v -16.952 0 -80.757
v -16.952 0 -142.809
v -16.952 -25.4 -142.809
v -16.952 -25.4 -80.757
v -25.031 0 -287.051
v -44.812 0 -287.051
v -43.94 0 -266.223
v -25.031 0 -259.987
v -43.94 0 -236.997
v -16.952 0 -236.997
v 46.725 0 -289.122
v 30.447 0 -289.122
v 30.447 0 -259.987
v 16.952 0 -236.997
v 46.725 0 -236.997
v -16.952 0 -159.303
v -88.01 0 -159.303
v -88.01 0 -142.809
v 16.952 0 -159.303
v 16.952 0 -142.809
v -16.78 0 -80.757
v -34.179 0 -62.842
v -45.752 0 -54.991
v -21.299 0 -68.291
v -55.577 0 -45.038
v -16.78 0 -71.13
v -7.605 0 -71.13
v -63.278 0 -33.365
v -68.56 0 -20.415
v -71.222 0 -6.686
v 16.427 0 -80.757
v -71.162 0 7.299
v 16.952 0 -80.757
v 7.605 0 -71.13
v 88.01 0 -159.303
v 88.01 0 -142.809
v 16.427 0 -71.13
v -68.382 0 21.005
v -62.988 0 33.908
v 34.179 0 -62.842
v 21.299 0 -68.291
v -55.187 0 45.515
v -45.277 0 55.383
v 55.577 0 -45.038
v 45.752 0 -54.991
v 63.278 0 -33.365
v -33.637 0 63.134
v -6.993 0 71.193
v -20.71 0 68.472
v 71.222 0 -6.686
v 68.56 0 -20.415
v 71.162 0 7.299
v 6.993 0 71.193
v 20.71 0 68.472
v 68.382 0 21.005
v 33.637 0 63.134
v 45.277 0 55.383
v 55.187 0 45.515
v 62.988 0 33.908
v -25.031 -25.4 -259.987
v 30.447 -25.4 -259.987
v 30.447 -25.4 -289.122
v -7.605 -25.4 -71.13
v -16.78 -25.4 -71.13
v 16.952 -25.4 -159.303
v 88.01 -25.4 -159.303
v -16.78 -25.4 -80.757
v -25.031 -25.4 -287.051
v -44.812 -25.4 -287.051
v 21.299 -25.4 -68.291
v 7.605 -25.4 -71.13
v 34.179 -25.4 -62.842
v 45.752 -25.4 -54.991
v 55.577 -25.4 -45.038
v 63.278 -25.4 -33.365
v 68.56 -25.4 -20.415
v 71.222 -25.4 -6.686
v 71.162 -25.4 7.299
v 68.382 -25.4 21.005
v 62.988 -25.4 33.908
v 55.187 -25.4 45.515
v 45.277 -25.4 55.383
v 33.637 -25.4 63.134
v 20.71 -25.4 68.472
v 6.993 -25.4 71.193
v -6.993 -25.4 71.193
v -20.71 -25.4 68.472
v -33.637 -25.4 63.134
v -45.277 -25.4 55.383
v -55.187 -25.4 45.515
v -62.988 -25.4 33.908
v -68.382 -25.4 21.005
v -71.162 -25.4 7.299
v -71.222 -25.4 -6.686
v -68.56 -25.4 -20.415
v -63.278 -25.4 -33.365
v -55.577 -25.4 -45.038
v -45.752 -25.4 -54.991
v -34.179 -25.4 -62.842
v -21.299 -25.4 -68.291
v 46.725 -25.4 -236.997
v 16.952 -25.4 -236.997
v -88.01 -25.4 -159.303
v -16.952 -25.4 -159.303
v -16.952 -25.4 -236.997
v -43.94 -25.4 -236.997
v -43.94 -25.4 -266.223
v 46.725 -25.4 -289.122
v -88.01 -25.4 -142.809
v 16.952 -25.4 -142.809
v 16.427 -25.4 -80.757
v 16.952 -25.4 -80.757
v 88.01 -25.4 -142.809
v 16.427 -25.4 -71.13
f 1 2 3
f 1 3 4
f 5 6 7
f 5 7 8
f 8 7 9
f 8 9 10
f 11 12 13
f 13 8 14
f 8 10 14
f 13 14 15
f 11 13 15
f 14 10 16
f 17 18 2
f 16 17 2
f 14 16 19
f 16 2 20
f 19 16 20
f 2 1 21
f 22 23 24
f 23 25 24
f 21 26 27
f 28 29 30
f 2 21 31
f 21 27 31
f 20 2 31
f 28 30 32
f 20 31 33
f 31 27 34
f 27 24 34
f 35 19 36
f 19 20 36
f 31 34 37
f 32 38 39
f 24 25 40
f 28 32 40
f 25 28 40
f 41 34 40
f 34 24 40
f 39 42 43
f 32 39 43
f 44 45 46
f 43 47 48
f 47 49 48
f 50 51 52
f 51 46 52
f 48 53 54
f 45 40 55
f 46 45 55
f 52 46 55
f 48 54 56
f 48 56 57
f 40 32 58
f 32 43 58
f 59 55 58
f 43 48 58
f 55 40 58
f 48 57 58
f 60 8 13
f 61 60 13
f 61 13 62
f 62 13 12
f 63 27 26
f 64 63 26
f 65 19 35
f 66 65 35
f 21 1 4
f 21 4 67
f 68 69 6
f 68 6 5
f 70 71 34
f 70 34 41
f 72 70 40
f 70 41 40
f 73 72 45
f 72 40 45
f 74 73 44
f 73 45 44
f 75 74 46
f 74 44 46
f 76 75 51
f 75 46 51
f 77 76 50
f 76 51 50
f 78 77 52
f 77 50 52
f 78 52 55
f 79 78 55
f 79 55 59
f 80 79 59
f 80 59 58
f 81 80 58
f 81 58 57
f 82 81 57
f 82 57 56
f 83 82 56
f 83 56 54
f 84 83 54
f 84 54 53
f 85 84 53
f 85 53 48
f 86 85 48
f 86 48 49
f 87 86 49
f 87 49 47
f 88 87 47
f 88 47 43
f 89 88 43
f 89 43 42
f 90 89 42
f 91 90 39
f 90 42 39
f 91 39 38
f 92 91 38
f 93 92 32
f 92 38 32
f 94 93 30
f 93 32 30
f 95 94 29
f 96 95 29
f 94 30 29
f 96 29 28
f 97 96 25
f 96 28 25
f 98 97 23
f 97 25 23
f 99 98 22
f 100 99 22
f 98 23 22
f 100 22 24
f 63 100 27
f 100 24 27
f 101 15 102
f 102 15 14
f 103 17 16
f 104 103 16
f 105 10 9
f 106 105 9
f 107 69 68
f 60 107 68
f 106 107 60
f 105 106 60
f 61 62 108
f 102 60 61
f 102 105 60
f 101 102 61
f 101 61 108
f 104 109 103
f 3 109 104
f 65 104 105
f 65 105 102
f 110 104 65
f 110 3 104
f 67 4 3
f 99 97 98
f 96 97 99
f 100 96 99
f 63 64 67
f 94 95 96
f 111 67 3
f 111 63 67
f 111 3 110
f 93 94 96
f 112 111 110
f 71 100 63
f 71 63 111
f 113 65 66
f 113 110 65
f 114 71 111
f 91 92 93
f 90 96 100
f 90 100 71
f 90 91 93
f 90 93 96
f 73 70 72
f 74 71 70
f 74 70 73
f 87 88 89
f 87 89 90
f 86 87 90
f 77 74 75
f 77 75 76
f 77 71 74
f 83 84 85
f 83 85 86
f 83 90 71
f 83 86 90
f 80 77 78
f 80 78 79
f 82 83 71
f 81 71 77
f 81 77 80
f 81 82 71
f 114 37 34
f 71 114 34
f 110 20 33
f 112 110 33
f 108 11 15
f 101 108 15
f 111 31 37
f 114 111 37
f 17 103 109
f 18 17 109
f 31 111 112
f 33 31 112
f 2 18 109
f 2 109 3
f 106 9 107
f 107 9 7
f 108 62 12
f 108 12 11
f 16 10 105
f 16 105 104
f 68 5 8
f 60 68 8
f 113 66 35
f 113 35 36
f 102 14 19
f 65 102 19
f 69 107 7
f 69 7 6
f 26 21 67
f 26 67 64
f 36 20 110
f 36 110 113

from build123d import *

# Parameters (mm, degrees)
F0_R      = 71.5350962672
F1_DEPTH  = 25.4
F4_W      = 16.7800951749
F4_H      = 74.4879245758
F4_W_2    = 16.4273940027
F5_DEPTH  = 25.4
F6_W      = 176.0196238756
F6_H      = 16.4934694767
F7_DEPTH  = 25.4
F8_W      = 33.9048393071
F8_H      = 156.475931406
F9_DEPTH  = 25.4
F11_DEPTH = 25.4


# Not quite as in the source:
# - the program builds the solid bodies; features that only make, move or delete a surface that nothing else refers to are left out


with BuildPart() as f1:
    # F0 (on Front) → F1 (new body)
    with BuildSketch(Plane.XZ):
        Circle(F0_R)
    extrude(amount=F1_DEPTH)

    # F4 (on Front) → F5 (join)
    with BuildSketch(Plane.XZ):
        with Locations((-8.3900475875, -108.3736568689)):
            Rectangle(F4_W, F4_H)
        with Locations((8.2136970013, -108.3736568689)):
            Rectangle(F4_W_2, F4_H)
    extrude(amount=F5_DEPTH)

    # F6 (on Front) → F7 (join)
    with BuildSketch(Plane.XZ):
        with Locations((0, -151.0558873415)):
            Rectangle(F6_W, F6_H)
    extrude(amount=F7_DEPTH)

    # F8 (on Front) → F9 (join)
    with BuildSketch(Plane.XZ):
        with Locations((0, -158.9946001768)):
            Rectangle(F8_W, F8_H)
    extrude(amount=F9_DEPTH)

    # F10 (on Front) → F11 (join)
    with BuildSketch(Plane.XZ):
        Polygon((46.7250607908, -236.9969040155), (0, -236.9969040155), (-43.9401827753, -236.9969040155), (-43.9401827753, -266.2233710289), (-44.8115989566, -287.0510220528), (-25.0311624259, -287.0510220528), (-25.0311624259, -259.9867582321), (30.4474048316, -259.9867582321), (30.4474048316, -289.1219854355), (46.7250607908, -289.1219854355), align=None)
    extrude(amount=F11_DEPTH)


solid = f1.part
